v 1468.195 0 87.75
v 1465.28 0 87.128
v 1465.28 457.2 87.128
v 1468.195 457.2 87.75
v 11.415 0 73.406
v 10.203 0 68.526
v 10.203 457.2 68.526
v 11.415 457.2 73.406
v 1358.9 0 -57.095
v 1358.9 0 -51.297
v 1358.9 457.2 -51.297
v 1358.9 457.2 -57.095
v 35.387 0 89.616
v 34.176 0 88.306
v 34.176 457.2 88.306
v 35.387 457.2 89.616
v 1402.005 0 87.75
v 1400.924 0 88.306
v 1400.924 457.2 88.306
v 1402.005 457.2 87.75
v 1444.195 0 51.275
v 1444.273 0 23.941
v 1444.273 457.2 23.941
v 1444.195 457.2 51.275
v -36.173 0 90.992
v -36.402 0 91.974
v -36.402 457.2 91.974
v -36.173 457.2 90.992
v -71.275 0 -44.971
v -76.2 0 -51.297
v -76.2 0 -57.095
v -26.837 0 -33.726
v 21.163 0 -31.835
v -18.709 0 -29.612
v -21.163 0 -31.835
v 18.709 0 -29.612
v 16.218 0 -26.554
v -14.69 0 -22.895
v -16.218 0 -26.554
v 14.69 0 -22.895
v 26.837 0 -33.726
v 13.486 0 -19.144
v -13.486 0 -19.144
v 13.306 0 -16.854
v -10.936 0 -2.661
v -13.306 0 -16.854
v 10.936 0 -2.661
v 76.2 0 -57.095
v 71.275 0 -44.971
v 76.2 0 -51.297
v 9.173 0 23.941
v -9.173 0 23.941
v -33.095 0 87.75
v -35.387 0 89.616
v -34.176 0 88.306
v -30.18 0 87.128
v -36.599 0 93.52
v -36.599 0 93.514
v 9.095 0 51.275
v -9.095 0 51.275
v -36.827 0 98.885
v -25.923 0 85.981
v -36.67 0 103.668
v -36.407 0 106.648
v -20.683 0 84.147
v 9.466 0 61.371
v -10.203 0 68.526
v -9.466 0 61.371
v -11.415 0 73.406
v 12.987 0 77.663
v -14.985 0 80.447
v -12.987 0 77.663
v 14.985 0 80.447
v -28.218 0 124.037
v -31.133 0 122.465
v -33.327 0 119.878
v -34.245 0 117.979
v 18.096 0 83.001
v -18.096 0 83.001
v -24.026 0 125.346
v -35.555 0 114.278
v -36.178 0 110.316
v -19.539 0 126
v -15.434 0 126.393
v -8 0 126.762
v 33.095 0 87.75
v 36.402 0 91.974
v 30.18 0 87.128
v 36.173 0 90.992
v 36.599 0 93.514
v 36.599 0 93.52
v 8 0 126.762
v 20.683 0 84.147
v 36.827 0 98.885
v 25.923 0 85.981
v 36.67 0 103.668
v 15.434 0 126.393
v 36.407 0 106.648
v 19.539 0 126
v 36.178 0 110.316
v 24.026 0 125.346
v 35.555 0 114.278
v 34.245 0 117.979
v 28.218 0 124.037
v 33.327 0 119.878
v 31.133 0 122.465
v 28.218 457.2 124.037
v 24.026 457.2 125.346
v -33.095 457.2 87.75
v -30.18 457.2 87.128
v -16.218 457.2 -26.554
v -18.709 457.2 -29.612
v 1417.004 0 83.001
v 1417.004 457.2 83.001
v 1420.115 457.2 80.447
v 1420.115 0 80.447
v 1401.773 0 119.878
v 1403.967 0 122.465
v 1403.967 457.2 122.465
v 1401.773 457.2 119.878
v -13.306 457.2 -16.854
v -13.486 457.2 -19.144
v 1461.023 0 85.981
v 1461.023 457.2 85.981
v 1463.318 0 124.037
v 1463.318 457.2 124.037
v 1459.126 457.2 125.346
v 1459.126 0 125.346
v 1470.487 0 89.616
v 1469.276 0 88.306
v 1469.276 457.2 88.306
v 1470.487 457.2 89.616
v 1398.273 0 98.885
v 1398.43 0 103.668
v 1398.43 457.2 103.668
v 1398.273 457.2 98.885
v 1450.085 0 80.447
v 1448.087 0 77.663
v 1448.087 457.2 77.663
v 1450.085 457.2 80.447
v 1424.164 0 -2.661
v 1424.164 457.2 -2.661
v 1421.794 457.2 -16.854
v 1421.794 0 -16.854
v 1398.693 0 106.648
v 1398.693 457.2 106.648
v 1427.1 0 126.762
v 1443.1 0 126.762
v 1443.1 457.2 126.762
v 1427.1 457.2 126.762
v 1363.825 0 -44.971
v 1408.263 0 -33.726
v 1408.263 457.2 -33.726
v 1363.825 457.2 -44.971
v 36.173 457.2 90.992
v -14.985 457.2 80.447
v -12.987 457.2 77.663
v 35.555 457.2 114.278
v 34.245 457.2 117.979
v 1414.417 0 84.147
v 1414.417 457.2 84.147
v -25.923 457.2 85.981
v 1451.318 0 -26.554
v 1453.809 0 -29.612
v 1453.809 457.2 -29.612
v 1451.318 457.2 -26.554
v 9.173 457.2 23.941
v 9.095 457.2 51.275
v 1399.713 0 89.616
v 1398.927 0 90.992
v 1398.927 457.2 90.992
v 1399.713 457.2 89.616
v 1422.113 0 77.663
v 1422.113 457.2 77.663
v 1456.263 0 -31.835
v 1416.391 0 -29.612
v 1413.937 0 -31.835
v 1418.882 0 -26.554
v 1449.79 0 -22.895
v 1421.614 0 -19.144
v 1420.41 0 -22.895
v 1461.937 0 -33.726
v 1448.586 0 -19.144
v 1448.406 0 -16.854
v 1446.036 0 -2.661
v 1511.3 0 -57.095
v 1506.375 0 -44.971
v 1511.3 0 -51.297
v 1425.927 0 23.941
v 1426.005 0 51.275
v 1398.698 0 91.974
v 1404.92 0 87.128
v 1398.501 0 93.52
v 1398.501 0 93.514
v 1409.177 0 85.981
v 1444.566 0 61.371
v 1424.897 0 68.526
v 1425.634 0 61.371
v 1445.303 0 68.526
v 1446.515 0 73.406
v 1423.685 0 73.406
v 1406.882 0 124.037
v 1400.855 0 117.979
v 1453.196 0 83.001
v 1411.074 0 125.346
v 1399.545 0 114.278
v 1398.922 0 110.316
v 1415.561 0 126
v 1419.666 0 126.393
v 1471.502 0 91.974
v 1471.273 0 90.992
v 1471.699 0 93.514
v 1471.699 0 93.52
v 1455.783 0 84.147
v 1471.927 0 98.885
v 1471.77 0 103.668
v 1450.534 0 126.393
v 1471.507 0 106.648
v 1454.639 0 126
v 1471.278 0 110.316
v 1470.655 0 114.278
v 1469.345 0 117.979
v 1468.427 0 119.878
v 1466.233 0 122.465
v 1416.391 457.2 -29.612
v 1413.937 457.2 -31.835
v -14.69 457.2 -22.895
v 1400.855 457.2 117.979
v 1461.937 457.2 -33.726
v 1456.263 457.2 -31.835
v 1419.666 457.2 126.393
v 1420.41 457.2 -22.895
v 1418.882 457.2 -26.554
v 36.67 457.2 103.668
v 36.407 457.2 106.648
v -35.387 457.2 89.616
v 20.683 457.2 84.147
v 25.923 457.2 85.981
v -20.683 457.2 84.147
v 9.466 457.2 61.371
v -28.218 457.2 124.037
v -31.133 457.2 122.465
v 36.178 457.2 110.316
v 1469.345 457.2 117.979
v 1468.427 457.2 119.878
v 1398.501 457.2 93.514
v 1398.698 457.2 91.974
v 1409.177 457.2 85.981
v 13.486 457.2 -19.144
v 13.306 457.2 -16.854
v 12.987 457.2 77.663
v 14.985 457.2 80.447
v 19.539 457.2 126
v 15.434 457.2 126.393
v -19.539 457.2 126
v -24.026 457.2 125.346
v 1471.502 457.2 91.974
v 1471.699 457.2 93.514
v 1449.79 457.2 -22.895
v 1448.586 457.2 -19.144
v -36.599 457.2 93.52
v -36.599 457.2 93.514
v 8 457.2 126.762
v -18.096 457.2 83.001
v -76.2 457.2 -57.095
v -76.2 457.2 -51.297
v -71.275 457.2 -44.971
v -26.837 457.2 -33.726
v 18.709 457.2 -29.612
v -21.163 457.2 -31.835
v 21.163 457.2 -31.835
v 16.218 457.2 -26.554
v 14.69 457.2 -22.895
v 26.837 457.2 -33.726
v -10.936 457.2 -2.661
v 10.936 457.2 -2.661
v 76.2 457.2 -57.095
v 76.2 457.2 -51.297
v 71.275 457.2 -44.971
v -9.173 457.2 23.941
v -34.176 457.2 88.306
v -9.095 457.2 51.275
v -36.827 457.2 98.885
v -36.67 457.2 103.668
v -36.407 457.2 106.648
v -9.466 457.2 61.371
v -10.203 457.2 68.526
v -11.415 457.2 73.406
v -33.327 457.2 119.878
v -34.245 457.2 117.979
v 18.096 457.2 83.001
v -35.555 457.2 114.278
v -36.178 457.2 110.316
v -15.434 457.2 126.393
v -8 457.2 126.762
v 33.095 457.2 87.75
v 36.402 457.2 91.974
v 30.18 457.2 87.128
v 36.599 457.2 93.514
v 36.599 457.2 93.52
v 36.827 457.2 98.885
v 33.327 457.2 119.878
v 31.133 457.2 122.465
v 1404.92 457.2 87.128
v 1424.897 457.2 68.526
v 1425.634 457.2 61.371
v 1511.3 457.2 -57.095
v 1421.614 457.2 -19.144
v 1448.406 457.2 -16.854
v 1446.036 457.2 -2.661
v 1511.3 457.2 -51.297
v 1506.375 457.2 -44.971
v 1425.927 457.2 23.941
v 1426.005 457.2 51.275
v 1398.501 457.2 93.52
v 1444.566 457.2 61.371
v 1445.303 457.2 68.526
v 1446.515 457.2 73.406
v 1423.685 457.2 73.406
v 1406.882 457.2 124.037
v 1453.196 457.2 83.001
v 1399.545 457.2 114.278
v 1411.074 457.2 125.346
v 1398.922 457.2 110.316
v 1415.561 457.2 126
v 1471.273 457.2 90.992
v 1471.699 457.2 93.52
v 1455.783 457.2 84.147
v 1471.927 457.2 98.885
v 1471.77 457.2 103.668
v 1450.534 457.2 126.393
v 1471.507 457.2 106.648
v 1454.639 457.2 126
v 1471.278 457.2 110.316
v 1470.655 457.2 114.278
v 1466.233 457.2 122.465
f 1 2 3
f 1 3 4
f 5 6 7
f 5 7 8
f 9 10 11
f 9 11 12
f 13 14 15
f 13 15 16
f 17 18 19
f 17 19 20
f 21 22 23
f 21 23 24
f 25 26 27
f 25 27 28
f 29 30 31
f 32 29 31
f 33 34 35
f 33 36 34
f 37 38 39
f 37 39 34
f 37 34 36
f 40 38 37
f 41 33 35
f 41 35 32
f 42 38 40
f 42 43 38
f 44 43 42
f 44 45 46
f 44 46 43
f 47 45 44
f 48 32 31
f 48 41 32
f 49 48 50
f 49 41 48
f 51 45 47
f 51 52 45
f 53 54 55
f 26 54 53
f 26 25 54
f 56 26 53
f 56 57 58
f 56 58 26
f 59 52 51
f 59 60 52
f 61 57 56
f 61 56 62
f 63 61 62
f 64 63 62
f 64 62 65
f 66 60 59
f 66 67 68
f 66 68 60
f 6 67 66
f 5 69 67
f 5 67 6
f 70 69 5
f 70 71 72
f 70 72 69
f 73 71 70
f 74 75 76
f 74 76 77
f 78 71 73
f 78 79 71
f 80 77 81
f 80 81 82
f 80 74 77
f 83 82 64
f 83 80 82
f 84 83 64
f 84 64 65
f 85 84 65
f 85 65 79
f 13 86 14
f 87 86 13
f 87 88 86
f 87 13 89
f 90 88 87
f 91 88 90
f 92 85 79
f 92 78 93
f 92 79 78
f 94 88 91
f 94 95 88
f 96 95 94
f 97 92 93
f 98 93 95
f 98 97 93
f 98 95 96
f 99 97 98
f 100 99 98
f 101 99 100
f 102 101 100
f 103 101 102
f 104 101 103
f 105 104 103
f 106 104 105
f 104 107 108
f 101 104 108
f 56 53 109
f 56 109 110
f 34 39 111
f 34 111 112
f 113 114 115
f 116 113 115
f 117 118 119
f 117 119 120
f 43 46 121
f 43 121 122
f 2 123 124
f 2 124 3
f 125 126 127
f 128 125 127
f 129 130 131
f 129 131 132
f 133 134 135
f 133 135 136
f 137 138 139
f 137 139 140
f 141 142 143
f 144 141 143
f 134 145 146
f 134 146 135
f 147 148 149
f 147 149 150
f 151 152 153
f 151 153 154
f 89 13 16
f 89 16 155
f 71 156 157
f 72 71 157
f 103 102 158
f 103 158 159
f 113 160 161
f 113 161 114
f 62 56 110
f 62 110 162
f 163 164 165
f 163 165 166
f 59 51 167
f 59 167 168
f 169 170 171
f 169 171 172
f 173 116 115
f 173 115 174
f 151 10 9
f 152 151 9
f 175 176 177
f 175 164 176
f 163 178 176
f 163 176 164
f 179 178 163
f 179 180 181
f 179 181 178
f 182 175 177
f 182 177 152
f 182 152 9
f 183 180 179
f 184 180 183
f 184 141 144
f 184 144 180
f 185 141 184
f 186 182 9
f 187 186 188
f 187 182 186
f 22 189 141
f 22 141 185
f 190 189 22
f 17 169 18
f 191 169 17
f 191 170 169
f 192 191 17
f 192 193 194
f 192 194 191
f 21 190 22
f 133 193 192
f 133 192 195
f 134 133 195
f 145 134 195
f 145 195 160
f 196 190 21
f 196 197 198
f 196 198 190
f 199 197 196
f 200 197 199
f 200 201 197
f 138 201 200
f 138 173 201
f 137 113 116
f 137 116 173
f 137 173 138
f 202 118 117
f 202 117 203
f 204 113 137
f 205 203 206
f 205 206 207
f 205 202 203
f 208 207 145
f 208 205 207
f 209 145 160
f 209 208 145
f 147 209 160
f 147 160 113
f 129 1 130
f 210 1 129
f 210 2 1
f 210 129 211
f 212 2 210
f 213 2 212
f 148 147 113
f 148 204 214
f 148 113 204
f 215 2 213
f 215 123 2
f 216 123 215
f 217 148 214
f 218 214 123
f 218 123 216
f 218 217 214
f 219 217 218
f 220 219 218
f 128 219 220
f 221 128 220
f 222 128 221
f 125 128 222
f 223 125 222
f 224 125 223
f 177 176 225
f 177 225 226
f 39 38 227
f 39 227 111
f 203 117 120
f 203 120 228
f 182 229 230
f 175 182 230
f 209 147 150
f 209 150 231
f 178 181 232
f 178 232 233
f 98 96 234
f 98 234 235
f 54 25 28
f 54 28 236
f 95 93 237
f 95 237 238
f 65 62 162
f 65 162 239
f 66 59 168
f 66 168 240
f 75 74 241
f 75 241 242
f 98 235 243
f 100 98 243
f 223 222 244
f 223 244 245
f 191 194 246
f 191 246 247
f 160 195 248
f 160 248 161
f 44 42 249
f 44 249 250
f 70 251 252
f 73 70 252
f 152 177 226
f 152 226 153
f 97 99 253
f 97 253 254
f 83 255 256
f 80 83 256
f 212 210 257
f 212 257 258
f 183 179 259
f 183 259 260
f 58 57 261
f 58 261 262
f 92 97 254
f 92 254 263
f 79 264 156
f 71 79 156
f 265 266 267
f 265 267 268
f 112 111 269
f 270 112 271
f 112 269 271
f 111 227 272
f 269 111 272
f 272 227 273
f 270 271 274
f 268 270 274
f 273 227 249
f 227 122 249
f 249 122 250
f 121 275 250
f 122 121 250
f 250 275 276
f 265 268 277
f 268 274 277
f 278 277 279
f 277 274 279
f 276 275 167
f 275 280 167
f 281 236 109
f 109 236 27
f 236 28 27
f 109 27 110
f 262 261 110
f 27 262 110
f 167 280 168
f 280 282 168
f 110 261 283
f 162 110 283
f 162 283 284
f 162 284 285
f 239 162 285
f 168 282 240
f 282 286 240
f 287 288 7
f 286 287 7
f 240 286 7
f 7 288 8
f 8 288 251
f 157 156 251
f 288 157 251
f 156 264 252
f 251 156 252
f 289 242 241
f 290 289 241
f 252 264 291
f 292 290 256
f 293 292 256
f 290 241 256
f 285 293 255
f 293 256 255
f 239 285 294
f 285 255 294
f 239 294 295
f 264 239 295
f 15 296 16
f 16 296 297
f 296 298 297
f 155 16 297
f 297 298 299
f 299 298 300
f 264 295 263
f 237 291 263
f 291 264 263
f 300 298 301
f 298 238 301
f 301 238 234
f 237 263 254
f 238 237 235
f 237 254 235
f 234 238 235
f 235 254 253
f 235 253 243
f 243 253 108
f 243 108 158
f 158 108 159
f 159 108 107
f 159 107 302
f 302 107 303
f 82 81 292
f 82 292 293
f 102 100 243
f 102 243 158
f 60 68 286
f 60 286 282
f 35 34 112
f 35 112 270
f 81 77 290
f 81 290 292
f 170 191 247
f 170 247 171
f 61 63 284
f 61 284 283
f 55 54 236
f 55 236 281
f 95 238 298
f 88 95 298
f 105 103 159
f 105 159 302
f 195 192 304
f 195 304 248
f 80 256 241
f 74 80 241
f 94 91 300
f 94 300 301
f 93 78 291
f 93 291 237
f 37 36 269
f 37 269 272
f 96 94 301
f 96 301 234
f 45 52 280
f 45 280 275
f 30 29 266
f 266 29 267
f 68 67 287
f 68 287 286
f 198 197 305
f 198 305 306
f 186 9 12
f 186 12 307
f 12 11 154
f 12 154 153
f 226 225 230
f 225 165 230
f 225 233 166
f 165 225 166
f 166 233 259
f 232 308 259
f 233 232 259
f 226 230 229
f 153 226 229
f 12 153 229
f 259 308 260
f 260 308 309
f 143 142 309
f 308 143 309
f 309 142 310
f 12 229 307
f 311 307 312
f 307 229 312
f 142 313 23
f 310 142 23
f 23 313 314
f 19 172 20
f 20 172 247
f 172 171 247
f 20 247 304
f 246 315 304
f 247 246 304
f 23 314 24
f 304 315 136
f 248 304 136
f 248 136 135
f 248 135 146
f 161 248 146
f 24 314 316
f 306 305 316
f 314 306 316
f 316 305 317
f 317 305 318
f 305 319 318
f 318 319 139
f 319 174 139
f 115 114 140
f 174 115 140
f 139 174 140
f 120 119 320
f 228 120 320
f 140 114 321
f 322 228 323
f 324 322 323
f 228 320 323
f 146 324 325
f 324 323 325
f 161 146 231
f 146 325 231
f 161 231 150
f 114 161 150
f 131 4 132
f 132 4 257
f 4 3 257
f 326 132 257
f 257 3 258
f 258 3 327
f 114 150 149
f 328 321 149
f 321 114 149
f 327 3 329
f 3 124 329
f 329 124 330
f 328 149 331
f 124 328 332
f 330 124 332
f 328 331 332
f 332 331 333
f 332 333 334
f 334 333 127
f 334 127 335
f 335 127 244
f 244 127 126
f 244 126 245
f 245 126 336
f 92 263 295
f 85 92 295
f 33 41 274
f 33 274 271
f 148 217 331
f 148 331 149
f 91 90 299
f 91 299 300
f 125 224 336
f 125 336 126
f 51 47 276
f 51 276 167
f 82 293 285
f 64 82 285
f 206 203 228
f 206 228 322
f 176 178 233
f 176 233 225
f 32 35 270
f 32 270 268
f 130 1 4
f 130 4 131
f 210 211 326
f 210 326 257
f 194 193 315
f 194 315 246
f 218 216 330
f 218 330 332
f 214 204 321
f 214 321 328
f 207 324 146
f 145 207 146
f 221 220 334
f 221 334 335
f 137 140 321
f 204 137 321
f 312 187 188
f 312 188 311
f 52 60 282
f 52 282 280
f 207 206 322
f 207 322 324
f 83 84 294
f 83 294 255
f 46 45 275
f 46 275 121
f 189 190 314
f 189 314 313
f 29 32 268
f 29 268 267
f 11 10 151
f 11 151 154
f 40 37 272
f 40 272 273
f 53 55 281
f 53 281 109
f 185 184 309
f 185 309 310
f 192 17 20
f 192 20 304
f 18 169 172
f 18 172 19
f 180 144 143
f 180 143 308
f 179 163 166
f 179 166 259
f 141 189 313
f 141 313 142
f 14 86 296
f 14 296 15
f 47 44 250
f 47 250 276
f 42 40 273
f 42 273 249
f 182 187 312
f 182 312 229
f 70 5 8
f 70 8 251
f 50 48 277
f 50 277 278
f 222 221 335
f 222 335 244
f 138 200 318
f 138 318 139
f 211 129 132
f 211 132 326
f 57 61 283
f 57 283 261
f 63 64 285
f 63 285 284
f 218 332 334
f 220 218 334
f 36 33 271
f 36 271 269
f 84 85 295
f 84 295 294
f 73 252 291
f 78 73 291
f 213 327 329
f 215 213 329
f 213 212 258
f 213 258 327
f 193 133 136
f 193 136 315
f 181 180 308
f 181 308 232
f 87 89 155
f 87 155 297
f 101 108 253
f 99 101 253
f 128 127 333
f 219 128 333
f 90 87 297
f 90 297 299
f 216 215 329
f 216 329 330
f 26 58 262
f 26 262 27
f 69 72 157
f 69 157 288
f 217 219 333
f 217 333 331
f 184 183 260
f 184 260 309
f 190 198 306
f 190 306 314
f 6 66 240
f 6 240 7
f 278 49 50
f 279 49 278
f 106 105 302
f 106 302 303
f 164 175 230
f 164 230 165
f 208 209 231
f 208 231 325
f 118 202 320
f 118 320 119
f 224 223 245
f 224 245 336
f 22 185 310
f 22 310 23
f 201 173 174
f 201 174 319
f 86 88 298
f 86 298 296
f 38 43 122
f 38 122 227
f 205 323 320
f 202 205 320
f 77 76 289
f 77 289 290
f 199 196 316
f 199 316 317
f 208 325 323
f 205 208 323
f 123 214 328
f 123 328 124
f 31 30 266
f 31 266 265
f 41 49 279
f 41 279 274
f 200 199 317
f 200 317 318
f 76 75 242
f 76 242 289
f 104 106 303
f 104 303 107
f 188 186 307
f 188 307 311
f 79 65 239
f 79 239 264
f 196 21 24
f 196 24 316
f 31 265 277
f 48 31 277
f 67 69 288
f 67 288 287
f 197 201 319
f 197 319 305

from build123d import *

# Parameters (mm, degrees)
F1_DEPTH = 457.2
F2_SIZE  = 5.08


with BuildPart() as f1:
    # F0 (on Front) → F1 (new body)
    with BuildSketch(Plane.XZ):
        Polygon((-76.2, -46.21704), (-76.2, -57.094753), (76.2, -57.094753), (76.2, -46.21704), (26.83735, -33.72637), (21.163462, -31.835258), (18.708812, -29.612178), (16.218112, -26.55388), (14.689744, -22.895062), (13.485576, -19.143616), (13.305501, -16.85449), (10.935693, -2.660843), (9.173225, 23.941404), (9.095304, 51.274587), (9.465817, 61.371074), (10.203332, 68.52603), (11.415046, 73.405639), (12.987001, 77.66302), (14.984693, 80.446691), (18.095852, 83.001115), (20.683027, 84.147327), (25.922873, 85.98128), (30.180251, 87.1275), (33.094916, 87.749728), (34.175634, 88.306465), (35.387348, 89.616426), (36.173157, 90.991981), (36.40228, 91.97448), (36.598587, 93.513711), (36.598872, 93.52041), (36.827176, 98.88458), (36.669851, 103.667696), (36.407496, 106.64783), (36.177806, 110.315693), (35.555092, 114.278253), (34.24468, 117.978737), (33.327476, 119.878062), (31.132972, 122.464971), (28.218115, 124.036569), (24.026078, 125.34602), (19.539378, 126.000454), (15.433662, 126.392808), (7.999516, 126.762047), (0, 126.762047), (-7.999516, 126.762047), (-15.433662, 126.392808), (-19.539378, 126.000454), (-24.026078, 125.34602), (-28.218115, 124.036569), (-31.132972, 122.464971), (-33.327476, 119.878062), (-34.24468, 117.978737), (-35.555092, 114.278253), (-36.177806, 110.315693), (-36.407496, 106.64783), (-36.669851, 103.667696), (-36.827176, 98.88458), (-36.598872, 93.52041), (-36.598587, 93.513711), (-36.40228, 91.97448), (-36.173157, 90.991981), (-35.387348, 89.616426), (-34.175634, 88.306465), (-33.094916, 87.749728), (-30.180251, 87.1275), (-25.922873, 85.98128), (-20.683027, 84.147327), (-18.095852, 83.001115), (-14.984693, 80.446691), (-12.987001, 77.66302), (-11.415046, 73.405639), (-10.203332, 68.52603), (-9.465817, 61.371074), (-9.095304, 51.274587), (-9.173225, 23.941404), (-10.935693, -2.660843), (-13.305501, -16.85449), (-13.485576, -19.143616), (-14.689744, -22.895062), (-16.218112, -26.55388), (-18.708812, -29.612178), (-21.163462, -31.835258), (-26.83735, -33.72637), align=None)
        Polygon((1469.275634, 88.306465), (1470.487348, 89.616426), (1471.273157, 90.991981), (1471.50228, 91.97448), (1471.698587, 93.513711), (1471.698872, 93.52041), (1471.927176, 98.88458), (1471.769851, 103.667696), (1471.507496, 106.64783), (1471.277806, 110.315693), (1470.655092, 114.278253), (1469.34468, 117.978737), (1468.427476, 119.878062), (1466.232972, 122.464971), (1463.318115, 124.036569), (1459.126078, 125.34602), (1454.639378, 126.000454), (1450.533662, 126.392808), (1443.099516, 126.762047), (1435.1, 126.762047), (1427.100484, 126.762047), (1419.666338, 126.392808), (1415.560622, 126.000454), (1411.073922, 125.34602), (1406.881885, 124.036569), (1403.967028, 122.464971), (1401.772524, 119.878062), (1400.85532, 117.978737), (1399.544908, 114.278253), (1398.922194, 110.315693), (1398.692504, 106.64783), (1398.430149, 103.667696), (1398.272824, 98.88458), (1398.501128, 93.52041), (1398.501413, 93.513711), (1398.69772, 91.97448), (1398.926843, 90.991981), (1399.712652, 89.616426), (1400.924366, 88.306465), (1402.005084, 87.749728), (1404.919749, 87.1275), (1409.177127, 85.98128), (1414.416973, 84.147327), (1417.004148, 83.001115), (1420.115307, 80.446691), (1422.112999, 77.66302), (1423.684954, 73.405639), (1424.896668, 68.52603), (1425.634183, 61.371074), (1426.004696, 51.274587), (1425.926775, 23.941404), (1424.164307, -2.660843), (1421.794499, -16.85449), (1421.614424, -19.143616), (1420.410256, -22.895062), (1418.881888, -26.55388), (1416.391188, -29.612178), (1413.936538, -31.835258), (1408.26265, -33.72637), (1358.9, -46.21704), (1358.9, -57.094753), (1511.3, -57.094753), (1511.3, -46.21704), (1461.93735, -33.72637), (1456.263462, -31.835258), (1453.808812, -29.612178), (1451.318112, -26.55388), (1449.789744, -22.895062), (1448.585576, -19.143616), (1448.405501, -16.85449), (1446.035693, -2.660843), (1444.273225, 23.941404), (1444.195304, 51.274587), (1444.565817, 61.371074), (1445.303332, 68.52603), (1446.515046, 73.405639), (1448.087001, 77.66302), (1450.084693, 80.446691), (1453.195852, 83.001115), (1455.783027, 84.147327), (1461.022873, 85.98128), (1465.280251, 87.1275), (1468.194916, 87.749728), align=None)
    extrude(amount=-F1_DEPTH)

    # F2
    f2_edges = [f1.edges().sort_by_distance(p)[0] for p in [
        (76.2, 228.6, -46.21704),
        (-76.2, 228.6, -46.21704),
        (1358.9, 228.6, -46.21704),
        (1511.3, 228.6, -46.21704),
    ]]
    chamfer(f2_edges, length=F2_SIZE)


solid = f1.part
